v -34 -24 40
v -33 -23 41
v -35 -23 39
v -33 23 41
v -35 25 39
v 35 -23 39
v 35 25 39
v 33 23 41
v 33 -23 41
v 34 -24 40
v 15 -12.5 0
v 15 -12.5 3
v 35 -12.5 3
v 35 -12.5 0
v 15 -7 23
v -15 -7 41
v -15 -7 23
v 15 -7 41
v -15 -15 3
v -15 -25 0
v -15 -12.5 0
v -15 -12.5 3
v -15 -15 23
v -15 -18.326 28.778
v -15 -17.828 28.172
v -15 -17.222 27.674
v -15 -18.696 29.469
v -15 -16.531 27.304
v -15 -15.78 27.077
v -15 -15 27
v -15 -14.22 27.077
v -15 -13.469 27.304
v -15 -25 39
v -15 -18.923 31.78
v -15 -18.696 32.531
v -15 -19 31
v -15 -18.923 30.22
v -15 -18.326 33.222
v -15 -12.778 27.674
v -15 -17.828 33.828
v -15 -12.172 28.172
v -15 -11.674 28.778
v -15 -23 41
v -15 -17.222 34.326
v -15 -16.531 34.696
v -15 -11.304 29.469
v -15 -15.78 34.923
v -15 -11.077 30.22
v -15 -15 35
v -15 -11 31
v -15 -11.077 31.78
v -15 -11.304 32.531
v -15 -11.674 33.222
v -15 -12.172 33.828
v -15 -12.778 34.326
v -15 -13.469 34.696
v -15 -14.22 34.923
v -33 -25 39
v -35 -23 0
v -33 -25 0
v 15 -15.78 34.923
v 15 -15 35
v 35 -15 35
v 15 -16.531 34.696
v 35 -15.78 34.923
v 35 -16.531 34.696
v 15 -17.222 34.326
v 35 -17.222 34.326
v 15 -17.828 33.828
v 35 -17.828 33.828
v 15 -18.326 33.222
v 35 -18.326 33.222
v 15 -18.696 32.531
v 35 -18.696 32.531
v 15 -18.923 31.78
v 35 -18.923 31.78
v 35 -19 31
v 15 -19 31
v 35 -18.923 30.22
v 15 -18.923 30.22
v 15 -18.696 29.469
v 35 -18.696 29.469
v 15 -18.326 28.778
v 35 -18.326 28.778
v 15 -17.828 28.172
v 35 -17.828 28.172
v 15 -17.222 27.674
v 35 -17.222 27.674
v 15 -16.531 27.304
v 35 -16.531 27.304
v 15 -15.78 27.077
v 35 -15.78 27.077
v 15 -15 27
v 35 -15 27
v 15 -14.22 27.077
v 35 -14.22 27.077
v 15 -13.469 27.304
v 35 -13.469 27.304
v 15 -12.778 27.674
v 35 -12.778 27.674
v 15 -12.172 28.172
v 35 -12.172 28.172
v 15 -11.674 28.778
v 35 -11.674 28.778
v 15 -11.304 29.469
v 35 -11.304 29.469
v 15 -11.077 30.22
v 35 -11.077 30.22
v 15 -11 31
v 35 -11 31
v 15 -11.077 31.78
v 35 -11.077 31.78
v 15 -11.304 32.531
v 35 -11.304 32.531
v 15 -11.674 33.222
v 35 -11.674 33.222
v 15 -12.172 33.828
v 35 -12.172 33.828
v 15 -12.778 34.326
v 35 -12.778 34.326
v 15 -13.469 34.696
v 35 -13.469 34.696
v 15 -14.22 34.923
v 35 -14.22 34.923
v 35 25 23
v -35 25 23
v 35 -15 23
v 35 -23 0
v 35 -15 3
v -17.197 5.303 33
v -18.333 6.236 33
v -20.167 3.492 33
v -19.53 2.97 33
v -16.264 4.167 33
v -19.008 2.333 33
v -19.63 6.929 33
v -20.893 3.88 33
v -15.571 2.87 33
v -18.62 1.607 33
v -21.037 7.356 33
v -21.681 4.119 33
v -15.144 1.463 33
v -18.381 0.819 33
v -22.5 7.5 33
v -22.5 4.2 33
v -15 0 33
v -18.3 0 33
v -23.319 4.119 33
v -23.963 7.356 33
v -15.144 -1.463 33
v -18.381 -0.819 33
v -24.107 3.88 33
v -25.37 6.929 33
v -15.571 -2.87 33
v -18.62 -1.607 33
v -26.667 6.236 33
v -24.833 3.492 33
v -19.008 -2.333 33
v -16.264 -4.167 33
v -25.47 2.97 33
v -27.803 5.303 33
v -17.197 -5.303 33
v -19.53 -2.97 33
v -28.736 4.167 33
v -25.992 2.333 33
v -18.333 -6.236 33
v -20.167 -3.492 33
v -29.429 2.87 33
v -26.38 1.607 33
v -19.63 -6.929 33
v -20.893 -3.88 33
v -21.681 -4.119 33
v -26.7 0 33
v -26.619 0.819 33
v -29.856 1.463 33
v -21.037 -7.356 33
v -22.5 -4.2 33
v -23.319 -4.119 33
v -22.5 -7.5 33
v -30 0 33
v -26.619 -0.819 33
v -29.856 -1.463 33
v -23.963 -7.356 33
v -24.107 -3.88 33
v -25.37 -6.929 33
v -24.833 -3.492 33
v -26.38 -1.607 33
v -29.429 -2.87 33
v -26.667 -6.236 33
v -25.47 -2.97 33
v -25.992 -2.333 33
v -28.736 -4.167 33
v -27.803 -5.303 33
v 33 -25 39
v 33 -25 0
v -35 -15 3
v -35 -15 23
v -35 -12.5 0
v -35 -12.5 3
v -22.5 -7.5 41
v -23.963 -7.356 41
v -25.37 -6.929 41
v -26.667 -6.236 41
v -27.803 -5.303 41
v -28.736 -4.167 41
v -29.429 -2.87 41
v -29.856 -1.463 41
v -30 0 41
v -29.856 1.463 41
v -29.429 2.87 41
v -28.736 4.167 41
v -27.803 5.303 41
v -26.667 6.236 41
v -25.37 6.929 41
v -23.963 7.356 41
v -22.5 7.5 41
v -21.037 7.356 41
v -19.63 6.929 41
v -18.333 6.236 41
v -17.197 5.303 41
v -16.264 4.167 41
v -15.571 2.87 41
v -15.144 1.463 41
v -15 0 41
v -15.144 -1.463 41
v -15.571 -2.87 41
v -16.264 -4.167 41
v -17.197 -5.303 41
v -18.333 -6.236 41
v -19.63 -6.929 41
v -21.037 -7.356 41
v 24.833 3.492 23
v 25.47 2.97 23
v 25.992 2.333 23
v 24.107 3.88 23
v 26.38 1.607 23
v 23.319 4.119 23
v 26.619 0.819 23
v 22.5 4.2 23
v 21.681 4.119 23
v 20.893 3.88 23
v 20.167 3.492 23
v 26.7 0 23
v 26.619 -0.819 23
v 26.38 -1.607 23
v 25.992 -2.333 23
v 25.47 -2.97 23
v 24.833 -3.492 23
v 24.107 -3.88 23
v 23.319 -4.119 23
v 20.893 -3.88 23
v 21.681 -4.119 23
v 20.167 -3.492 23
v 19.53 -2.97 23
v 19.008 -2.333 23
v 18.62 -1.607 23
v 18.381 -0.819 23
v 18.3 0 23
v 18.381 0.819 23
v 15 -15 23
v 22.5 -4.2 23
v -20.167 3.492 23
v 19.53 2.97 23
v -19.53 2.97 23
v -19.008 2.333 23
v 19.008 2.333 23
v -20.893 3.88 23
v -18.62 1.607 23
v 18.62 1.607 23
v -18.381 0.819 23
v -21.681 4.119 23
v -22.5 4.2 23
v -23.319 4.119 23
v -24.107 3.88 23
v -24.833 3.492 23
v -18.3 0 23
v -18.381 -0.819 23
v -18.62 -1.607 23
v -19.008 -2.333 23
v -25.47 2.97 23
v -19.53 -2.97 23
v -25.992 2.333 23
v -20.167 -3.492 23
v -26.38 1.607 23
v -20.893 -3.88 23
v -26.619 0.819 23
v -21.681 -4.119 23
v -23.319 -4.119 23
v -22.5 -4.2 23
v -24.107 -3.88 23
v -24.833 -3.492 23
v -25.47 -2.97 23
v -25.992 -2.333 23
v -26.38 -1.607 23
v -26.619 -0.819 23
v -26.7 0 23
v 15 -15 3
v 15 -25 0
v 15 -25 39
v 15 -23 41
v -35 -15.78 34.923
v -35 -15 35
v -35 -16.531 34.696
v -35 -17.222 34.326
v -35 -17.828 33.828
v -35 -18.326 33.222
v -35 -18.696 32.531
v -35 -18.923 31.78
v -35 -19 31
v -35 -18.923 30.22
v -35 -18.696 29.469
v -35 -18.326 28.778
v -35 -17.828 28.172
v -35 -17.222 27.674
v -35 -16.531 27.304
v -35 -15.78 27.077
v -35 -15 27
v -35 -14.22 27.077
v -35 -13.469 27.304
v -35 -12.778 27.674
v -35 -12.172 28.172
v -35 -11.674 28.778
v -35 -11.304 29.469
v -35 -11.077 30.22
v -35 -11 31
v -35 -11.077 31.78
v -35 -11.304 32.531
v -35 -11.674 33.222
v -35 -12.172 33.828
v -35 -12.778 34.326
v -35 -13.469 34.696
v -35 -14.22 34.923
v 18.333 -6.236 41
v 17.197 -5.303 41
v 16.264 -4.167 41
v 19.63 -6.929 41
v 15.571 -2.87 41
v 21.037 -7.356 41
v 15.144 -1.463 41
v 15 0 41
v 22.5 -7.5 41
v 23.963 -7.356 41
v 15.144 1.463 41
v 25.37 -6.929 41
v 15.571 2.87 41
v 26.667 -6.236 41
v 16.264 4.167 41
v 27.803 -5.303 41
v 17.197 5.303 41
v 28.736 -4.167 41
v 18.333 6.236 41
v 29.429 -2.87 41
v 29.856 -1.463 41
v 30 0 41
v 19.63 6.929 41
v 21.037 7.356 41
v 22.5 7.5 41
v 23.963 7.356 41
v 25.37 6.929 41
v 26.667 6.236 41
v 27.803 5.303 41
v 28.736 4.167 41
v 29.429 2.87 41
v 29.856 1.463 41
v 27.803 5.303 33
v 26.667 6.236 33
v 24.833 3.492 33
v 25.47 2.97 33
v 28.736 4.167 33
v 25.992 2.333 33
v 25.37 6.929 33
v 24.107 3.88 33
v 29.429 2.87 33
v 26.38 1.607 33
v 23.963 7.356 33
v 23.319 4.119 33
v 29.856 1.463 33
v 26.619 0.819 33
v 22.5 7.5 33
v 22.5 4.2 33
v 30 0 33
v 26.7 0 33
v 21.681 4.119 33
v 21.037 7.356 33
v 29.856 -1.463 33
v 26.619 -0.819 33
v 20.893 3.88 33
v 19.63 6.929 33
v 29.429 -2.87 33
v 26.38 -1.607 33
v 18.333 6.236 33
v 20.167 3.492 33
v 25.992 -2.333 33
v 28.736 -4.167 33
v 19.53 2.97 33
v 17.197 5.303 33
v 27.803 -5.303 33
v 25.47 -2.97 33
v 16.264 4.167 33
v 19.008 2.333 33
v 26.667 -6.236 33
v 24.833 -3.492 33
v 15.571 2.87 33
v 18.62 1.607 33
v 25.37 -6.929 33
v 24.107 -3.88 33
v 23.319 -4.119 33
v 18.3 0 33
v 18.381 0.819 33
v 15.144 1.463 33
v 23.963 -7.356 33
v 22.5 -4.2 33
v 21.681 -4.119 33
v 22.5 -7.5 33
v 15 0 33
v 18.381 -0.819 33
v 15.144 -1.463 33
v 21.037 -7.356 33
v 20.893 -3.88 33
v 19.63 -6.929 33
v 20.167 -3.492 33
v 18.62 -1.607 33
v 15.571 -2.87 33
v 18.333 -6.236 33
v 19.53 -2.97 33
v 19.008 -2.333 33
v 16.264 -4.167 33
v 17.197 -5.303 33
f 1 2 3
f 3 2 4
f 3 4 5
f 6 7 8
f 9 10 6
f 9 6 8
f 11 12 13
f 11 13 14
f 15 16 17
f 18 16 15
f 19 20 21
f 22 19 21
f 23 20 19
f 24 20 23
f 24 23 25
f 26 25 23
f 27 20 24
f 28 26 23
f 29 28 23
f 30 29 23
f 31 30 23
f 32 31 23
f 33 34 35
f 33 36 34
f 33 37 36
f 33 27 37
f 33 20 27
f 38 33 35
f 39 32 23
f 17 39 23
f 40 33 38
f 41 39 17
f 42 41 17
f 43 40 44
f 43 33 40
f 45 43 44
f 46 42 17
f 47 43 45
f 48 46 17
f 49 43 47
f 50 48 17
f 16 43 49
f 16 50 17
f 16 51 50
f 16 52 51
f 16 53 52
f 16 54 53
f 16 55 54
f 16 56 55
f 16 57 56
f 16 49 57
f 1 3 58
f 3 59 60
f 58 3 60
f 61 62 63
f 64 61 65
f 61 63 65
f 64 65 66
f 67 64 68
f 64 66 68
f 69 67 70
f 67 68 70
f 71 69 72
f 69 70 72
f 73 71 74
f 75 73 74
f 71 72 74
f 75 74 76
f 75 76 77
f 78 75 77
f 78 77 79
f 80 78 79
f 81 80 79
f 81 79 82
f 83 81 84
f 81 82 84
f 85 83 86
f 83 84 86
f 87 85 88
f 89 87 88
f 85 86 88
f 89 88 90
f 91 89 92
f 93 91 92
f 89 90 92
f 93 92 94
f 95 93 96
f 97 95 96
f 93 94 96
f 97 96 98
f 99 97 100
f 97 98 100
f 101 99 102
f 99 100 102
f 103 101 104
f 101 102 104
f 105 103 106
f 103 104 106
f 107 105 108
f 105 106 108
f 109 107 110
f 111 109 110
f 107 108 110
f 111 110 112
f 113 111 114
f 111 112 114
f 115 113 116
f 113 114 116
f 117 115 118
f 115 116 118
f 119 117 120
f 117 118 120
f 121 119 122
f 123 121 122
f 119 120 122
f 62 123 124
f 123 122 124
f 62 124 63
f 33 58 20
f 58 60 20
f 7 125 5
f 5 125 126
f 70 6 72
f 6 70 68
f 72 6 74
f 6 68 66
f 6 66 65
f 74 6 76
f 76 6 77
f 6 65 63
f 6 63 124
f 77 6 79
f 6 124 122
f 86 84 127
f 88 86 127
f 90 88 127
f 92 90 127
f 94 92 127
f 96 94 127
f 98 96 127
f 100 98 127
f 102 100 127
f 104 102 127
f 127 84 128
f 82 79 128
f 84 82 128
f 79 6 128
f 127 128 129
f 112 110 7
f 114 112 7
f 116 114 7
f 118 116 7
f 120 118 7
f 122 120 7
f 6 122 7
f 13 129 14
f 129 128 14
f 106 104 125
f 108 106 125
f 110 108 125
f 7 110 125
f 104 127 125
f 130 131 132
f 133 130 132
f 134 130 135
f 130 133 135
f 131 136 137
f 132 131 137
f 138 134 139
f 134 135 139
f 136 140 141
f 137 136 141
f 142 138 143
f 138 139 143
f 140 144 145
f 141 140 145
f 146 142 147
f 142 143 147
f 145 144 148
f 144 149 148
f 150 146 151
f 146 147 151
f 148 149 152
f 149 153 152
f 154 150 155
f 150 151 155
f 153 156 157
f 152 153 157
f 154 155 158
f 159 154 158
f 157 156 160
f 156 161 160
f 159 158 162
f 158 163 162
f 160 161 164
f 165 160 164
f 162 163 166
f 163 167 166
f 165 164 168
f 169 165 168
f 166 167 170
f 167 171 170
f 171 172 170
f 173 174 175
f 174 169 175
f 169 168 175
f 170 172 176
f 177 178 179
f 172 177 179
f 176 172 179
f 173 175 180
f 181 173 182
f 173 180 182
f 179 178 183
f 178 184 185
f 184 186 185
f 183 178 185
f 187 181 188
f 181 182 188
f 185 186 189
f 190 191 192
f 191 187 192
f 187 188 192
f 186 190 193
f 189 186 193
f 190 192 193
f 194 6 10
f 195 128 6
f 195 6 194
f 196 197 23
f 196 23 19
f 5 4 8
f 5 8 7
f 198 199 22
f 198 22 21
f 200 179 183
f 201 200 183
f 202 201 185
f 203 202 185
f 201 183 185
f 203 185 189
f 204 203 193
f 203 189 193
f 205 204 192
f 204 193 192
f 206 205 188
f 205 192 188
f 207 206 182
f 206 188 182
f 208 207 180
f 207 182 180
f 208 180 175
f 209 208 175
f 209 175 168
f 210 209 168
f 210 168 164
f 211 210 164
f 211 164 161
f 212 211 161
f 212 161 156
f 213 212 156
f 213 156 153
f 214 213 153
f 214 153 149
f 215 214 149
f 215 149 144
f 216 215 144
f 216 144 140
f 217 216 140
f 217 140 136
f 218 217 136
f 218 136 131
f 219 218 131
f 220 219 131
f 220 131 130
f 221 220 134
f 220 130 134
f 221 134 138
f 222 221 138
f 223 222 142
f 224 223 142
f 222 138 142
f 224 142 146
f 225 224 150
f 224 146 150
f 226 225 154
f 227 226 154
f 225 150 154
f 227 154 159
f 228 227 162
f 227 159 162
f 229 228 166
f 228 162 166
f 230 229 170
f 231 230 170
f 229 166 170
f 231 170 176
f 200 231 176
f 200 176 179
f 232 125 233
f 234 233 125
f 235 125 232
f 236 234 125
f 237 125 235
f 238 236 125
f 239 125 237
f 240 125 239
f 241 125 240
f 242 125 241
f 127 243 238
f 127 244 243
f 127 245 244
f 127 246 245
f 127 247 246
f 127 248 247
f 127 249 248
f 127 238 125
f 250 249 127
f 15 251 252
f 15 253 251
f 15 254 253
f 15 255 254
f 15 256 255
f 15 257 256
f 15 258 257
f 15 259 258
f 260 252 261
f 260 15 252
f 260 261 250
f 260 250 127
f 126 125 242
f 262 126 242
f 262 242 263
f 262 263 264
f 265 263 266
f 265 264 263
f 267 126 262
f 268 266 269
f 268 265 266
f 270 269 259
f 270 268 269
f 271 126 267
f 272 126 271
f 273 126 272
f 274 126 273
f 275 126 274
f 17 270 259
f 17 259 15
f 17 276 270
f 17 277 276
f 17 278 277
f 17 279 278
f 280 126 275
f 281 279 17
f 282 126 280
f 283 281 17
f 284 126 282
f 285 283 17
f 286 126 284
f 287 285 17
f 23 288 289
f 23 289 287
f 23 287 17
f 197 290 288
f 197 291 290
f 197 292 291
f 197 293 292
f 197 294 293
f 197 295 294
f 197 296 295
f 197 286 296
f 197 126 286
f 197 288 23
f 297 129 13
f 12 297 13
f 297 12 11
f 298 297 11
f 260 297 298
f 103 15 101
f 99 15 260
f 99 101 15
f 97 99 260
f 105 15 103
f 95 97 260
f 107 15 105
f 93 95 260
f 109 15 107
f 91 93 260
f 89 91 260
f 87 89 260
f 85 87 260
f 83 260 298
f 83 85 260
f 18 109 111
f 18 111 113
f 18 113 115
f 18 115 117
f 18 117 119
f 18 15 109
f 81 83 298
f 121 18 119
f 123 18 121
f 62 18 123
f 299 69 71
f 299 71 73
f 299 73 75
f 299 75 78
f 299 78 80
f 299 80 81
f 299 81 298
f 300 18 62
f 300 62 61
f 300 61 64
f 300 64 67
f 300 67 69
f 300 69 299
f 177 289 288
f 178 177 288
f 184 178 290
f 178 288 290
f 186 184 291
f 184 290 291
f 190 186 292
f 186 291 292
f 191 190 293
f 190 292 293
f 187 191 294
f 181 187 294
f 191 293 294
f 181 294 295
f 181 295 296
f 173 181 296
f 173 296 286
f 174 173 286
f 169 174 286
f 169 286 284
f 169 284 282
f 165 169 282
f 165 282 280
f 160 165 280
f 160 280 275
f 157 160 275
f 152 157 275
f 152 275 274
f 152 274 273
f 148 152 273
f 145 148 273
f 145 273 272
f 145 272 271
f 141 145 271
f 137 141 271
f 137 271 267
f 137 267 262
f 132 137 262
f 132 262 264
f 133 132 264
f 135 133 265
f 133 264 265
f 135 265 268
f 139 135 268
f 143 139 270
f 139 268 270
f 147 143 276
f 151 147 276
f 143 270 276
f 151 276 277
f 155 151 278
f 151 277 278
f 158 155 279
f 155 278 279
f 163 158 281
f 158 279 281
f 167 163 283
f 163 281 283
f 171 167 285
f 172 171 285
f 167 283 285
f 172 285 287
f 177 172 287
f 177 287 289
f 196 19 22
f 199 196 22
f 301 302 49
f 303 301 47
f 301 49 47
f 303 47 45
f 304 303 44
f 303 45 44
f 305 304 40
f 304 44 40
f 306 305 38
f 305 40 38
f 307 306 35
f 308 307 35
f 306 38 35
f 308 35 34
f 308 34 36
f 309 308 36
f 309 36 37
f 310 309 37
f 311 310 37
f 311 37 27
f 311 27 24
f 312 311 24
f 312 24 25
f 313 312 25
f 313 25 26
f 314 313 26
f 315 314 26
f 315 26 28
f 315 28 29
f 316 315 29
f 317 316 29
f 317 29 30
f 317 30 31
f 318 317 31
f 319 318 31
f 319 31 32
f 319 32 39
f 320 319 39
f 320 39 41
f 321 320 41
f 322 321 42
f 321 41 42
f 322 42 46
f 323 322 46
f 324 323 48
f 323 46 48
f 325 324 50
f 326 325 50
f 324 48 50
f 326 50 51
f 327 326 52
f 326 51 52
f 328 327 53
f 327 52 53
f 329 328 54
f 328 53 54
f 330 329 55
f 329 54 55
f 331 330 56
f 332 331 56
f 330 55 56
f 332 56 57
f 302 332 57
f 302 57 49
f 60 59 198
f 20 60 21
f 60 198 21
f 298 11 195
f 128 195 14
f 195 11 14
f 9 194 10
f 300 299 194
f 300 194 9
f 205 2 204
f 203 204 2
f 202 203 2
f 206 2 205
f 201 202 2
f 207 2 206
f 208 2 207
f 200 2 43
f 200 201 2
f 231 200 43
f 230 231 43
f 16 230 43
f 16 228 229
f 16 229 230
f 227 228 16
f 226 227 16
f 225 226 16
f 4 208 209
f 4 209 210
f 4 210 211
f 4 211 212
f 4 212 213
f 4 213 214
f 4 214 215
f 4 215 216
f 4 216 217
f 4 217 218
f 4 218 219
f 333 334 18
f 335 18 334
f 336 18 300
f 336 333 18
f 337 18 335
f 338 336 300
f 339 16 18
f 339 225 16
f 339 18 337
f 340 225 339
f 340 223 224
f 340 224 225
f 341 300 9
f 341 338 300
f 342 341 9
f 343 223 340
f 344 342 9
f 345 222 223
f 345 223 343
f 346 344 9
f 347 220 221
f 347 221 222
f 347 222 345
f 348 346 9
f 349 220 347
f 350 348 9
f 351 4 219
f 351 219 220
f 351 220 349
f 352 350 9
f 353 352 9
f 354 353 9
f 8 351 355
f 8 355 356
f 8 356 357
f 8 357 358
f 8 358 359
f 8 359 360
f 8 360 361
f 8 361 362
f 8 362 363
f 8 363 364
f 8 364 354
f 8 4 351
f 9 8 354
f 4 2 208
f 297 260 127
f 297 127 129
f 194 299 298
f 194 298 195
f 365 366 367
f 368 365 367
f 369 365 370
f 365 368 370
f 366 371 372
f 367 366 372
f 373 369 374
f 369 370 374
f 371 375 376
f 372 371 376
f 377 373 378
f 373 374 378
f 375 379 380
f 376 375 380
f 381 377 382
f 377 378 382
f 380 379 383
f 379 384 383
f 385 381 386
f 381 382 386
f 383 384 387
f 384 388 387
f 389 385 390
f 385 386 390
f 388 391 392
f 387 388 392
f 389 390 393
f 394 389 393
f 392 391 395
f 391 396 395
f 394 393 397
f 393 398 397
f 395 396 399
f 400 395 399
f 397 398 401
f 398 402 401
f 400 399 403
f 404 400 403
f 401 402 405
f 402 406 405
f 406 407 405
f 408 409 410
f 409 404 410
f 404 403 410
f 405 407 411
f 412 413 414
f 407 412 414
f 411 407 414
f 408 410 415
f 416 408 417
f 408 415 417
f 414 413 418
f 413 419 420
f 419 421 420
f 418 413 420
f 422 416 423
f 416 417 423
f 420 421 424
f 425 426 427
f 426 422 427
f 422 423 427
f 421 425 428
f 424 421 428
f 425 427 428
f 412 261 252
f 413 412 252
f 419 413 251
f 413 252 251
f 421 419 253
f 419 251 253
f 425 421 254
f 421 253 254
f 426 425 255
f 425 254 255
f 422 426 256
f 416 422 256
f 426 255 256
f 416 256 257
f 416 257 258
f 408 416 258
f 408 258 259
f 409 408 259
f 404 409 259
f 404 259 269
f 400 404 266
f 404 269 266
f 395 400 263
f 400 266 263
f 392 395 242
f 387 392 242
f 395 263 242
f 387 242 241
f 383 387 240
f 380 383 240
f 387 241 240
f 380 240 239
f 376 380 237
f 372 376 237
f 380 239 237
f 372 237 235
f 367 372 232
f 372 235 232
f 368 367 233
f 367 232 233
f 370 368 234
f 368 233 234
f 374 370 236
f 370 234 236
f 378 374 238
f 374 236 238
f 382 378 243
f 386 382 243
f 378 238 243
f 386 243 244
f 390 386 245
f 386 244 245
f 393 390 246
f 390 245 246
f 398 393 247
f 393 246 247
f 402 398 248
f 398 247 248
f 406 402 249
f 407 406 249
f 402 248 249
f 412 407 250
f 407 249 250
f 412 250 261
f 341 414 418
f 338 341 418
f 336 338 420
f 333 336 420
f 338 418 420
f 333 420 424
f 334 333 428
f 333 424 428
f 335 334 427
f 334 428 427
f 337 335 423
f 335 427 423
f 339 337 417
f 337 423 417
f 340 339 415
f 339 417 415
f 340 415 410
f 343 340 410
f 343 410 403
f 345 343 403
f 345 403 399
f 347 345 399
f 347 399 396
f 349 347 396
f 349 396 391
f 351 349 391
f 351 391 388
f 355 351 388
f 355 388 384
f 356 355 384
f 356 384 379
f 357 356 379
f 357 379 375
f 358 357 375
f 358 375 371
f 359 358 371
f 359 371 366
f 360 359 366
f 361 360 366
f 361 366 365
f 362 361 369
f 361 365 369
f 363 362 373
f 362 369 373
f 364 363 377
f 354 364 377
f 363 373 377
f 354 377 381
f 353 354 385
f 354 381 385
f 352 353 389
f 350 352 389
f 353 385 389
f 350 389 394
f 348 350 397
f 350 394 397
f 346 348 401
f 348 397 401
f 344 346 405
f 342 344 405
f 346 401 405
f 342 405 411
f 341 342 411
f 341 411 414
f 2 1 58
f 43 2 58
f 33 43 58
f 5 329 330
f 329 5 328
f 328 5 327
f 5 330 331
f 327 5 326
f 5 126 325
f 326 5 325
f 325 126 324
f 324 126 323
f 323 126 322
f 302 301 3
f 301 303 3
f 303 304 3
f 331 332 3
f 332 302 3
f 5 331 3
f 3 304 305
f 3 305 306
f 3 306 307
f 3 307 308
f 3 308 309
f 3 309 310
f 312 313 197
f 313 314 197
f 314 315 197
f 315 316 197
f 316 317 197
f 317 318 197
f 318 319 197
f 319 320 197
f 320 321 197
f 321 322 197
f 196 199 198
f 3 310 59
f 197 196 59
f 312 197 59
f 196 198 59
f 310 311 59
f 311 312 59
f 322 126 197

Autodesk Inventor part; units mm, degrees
ref_plane "YZ Plane" through (0, 0, 0) normal (1, 0, 0) x (0, 1, 0)
ref_plane "XZ Plane" through (0, 0, 0) normal (0, 1, 0) x (-1, 0, 0)
ref_plane "XY Plane" through (0, 0, 0) normal (0, 0, 1) x (1, 0, 0)
sketch "Sketch1" plane through (0, 0, 0) normal (0, 0, 1) x (1, 0, 0)
  line L0 (35, 25) -> (-35, 25)
  line L1 (-35, 25) -> (-35, -25)
  line L2 (-35, -25) -> (35, -25)
  line L3 (35, -25) -> (35, 25)
  line L4 (35, 25) -> (-35, -25) construction
  line L5 (-35, 25) -> (35, -25) construction
  point P0 (0, 0)
  dimension "d0" = 70
  dimension "d1" = 50
extrude "Extrusion1" add sketch "Sketch1" along normal blind 41
sketch "Sketch2" plane through (-35, -25, 0) normal (-1, 0, 0) x (0, 0, 1)
  line L0 (0, 50) -> (23, 50)
  line L1 (0, 50) -> (41, 50) projected
  line L2 (23, 50) -> (23, 10)
  line L3 (23, 10) -> (3, 10)
  line L4 (3, 10) -> (3, 12.5)
  line L5 (3, 12.5) -> (0, 12.5)
  line L6 (0, 0) -> (41, 0) projected
  line L7 (0, 50) -> (0, 12.5)
  point P0 (0, 25)
  dimension "d4" = 23
  dimension "d5" = 40
  dimension "d6" = 20
  dimension "d7" = 12.5
extrude "Extrusion2" cut sketch "Sketch2" against normal through all
sketch "Sketch3" plane through (0, 0, 41) normal (0, 0, 1) x (1, 0, 0)
  line L0 (-15, -7) -> (15, -7)
  line L1 (15, -7) -> (15, -25)
  line L2 (15, -25) -> (-15, -25)
  line L3 (-15, -25) -> (-15, -7)
  line L4 (-35, -25) -> (35, -25) projected
  point P0 (0, 0)
  dimension "d10" = 30
  dimension "d11" = 18
  dimension "d12" = 15
  dimension "d13" = 0
extrude "Extrusion3" cut sketch "Sketch3" against normal through all
sketch "Sketch4" plane through (0, 0, 41) normal (0, 0, 1) x (1, 0, 0)
  line L0 (35, 25) -> (-35, 25) projected
  point P0 (0, 0)
  point P1 (-22.5, 0)
  point P2 (22.5, 0)
  dimension "d16" = 25
  dimension "d17" = 22.5
  dimension "d18" = 45
  dimension "d19" = 25
hole "Hole1" at (-22.5, 0, 41) at (22.5, 0, 41) direction (0, 0, -1) diameter 8.4 end through all counterbore diameter 15 counterbore depth 8
sketch "Sketch5" plane through (-35, -25, 41) normal (-1, 0, 0) x (0, 0, 1)
  line L0 (0, 50) -> (0, 0) projected
  line L1 (-41, 0) -> (0, 0) projected
  point P0 (-41, 25)
  point P1 (-10, 10)
  dimension "d27" = 10
  dimension "d28" = 10
hole "Hole2" at (-35, -15, 31) direction (1, 0, 0) diameter 8 end through all
chamfer "Chamfer1" distance 2 angle 45 7 edges at (-35, 0, 41) (-25, -25, 41) (0, 25, 41) (35, 0, 41) (25, -25, 41) (-35, -25, 20.5) (35, -25, 20.5)
properties part number "Lager" material "Iron, Cast"
